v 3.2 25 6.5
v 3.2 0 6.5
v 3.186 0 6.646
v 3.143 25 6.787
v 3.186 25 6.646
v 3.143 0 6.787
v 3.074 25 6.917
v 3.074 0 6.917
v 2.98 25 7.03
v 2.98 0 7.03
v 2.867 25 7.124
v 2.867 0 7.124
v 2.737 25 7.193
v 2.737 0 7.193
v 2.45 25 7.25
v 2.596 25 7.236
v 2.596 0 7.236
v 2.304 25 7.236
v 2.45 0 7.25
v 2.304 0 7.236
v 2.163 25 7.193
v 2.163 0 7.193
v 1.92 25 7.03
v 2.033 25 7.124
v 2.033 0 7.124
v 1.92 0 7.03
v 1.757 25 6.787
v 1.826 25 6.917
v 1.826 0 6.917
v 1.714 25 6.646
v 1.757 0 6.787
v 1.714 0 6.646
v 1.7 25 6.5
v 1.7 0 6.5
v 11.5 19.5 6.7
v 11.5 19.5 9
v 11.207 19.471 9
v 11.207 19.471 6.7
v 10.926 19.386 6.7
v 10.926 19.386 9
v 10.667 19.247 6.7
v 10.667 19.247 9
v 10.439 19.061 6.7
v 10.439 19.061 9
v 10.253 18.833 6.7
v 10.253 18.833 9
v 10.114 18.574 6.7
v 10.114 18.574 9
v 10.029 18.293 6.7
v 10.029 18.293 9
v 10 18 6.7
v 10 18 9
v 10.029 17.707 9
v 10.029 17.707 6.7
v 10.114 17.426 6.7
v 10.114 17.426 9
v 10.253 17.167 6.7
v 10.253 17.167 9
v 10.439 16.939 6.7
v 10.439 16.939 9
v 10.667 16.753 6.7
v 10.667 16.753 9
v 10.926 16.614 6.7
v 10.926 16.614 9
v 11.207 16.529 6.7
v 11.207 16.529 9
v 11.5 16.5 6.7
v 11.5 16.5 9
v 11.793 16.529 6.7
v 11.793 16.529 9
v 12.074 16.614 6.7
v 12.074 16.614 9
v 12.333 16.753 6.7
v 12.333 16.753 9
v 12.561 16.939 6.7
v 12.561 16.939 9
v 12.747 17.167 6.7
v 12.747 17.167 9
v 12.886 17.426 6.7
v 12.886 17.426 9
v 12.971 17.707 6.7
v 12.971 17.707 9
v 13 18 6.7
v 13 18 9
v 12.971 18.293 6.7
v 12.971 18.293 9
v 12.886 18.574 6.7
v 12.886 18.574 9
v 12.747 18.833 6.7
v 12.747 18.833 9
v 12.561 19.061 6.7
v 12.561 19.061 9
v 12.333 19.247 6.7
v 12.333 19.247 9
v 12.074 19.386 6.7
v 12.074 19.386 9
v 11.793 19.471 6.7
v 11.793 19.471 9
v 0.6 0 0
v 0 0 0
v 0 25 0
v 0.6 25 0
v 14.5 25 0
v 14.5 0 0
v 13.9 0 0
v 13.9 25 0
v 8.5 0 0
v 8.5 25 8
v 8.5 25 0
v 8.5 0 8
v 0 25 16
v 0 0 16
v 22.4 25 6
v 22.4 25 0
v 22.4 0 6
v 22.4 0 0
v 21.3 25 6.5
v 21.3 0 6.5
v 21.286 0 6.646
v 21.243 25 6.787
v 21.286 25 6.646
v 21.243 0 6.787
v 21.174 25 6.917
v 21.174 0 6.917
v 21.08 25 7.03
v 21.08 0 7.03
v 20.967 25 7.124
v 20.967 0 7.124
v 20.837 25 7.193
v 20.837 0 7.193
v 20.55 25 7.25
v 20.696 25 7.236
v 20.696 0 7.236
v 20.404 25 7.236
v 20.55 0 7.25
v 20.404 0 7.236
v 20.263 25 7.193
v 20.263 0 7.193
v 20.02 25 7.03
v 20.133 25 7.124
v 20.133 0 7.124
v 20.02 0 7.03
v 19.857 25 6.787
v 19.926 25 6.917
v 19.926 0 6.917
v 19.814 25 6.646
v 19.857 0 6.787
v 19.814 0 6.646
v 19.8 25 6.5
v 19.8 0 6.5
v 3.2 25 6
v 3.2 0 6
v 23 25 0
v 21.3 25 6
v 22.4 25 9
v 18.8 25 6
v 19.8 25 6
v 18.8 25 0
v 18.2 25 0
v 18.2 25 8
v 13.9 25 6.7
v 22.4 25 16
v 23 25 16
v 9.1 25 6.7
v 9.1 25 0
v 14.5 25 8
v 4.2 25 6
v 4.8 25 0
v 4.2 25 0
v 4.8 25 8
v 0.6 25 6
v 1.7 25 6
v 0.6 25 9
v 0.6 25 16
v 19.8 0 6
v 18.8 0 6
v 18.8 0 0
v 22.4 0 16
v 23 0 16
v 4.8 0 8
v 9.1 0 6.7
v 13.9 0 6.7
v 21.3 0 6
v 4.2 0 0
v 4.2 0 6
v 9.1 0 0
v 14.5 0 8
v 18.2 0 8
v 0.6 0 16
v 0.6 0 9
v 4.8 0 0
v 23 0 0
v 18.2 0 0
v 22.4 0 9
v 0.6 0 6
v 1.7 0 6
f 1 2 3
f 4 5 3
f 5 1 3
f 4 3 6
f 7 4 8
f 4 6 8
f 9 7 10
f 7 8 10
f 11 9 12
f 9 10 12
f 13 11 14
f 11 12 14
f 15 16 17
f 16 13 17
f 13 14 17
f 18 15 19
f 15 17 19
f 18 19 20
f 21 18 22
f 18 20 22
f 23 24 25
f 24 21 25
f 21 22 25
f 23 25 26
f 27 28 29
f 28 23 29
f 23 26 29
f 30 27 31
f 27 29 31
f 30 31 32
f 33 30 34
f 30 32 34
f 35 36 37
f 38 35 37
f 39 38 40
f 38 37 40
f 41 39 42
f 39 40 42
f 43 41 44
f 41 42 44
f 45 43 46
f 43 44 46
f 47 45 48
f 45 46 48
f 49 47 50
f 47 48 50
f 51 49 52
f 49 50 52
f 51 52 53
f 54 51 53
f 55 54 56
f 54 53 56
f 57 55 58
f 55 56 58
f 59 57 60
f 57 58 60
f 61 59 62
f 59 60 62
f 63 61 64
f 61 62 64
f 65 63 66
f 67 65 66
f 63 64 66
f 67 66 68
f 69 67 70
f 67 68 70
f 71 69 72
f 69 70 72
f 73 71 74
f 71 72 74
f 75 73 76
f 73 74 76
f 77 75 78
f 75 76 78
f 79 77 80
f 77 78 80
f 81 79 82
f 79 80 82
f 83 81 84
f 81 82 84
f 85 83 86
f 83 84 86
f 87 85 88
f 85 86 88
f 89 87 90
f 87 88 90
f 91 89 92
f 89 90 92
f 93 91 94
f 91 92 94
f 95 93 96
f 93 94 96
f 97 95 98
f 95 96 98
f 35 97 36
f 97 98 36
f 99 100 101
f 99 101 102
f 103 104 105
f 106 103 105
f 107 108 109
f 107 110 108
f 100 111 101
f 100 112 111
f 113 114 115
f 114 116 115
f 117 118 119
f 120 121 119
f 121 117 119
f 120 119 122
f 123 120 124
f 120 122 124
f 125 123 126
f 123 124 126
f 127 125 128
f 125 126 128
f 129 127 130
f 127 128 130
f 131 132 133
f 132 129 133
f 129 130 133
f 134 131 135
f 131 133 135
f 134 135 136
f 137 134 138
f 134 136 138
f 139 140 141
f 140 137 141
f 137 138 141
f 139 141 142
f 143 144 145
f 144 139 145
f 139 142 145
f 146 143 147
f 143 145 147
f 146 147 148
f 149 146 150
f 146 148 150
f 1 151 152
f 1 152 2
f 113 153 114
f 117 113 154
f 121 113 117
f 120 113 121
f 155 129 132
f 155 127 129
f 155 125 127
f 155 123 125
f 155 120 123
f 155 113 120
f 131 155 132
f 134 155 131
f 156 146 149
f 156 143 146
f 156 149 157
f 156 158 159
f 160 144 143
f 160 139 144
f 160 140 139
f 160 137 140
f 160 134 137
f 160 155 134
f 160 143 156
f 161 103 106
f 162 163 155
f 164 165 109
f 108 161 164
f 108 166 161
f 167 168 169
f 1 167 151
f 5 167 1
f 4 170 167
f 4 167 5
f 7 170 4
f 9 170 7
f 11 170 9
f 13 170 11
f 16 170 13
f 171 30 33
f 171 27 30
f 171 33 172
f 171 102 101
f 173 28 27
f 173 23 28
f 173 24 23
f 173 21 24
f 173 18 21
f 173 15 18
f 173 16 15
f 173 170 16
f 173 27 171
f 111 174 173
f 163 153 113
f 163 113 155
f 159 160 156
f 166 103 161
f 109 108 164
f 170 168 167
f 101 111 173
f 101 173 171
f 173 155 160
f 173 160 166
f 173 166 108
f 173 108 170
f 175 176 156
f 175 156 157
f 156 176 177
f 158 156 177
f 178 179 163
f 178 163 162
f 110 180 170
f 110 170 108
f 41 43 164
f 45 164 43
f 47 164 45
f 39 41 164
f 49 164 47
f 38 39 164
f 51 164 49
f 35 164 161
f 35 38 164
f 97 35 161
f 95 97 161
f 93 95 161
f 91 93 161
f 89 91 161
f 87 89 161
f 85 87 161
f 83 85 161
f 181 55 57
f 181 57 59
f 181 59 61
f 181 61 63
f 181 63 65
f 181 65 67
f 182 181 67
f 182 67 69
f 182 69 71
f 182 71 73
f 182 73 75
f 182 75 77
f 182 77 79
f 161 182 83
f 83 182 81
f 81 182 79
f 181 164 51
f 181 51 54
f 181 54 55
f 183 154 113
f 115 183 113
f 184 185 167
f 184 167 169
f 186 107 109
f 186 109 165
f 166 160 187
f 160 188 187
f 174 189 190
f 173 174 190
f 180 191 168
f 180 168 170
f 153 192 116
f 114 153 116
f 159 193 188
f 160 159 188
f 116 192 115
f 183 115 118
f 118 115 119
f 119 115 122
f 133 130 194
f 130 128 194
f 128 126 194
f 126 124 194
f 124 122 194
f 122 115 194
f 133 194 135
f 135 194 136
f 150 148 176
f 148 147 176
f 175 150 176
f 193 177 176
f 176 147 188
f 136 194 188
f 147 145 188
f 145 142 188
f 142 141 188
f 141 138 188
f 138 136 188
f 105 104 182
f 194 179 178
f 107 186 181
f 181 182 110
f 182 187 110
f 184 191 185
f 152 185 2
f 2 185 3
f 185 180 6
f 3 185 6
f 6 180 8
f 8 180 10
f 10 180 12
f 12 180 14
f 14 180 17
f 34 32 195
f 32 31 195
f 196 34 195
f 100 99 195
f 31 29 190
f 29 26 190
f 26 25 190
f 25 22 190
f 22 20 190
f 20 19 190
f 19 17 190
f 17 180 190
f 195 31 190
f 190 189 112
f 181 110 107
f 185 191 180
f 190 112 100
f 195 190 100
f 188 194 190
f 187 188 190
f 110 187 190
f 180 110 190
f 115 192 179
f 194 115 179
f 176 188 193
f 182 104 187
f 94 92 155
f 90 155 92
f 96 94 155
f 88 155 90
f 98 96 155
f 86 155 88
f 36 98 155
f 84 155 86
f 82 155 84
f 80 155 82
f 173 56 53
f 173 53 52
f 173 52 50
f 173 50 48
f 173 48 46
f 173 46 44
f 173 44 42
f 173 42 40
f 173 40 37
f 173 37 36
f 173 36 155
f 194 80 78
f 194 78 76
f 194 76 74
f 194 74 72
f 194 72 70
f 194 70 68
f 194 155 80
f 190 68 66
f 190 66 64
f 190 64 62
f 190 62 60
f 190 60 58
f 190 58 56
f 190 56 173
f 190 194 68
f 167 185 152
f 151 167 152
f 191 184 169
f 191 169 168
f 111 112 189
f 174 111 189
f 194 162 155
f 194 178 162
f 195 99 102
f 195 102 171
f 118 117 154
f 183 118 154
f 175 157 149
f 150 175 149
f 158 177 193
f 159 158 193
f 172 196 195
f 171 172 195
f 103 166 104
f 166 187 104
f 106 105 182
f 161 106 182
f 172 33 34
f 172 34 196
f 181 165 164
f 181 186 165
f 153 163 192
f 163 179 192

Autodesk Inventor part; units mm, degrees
ref_plane "YZ Plane" through (0, 0, 0) normal (1, 0, 0) x (0, 1, 0)
ref_plane "XZ Plane" through (0, 0, 0) normal (0, 1, 0) x (-1, 0, 0)
ref_plane "XY Plane" through (0, 0, 0) normal (0, 0, 1) x (1, 0, 0)
sketch "Skizze1" plane through (0, 0, 0) normal (0, 1, 0) x (-1, 0, 0)
  line L0 (0, 16) -> (0, 0)
  line L1 (0, 16) -> (-0.6, 16)
  line L2 (-0.6, 16) -> (-0.6, 9)
  line L3 (0, 0) -> (-0.6, 0)
  line L4 (0, 0) -> (0.6, 0) construction
  line L5 (-0.6, 0) -> (-0.6, 6)
  line L6 (-4.2, 6) -> (-3.2, 6)
  line L7 (-3.2, 6) -> (-3.2, 6.5)
  arc A0 (-1.7, 6.5) -> (-3.2, 6.5) centre (-2.45, 6.5) ccw
  line L8 (-1.7, 6.5) -> (-1.7, 6)
  line L9 (-1.7, 6) -> (-0.6, 6)
  line L10 (-11.5, 23.3819) -> (-11.5, -15) construction
  line L11 (-4.2, 6) -> (-4.2, 0)
  line L12 (-4.2, 0) -> (-4.8, 0)
  line L13 (-4.8, 0) -> (-4.8, 8)
  line L14 (-4.8, 8) -> (-8.5, 8)
  line L15 (-0.6, 9) -> (-11.5, 9)
  line L16 (-8.5, 8) -> (-8.5, 0)
  line L17 (-8.5, 0) -> (-9.1, 0)
  line L18 (-9.1, 0) -> (-9.1, 6.7)
  line L19 (-9.1, 6.7) -> (-11.5, 6.7)
  line L20 (-23, 16) -> (-23, 0)
  line L21 (-23, 16) -> (-22.4, 16)
  line L22 (-22.4, 16) -> (-22.4, 9)
  line L23 (-23, 0) -> (-22.4, 0)
  line L24 (-23, 0) -> (-23.6, 0) construction
  line L25 (-22.4, 0) -> (-22.4, 6)
  line L26 (-19.8, 6) -> (-19.8, 6.5)
  line L27 (-18.8, 6) -> (-19.8, 6)
  arc A1 (-19.8, 6.5) -> (-21.3, 6.5) centre (-20.55, 6.5) ccw
  line L28 (-21.3, 6.5) -> (-21.3, 6)
  line L29 (-21.3, 6) -> (-22.4, 6)
  line L30 (-18.8, 6) -> (-18.8, 0)
  line L31 (-18.8, 0) -> (-18.2, 0)
  line L32 (-18.2, 0) -> (-18.2, 8)
  line L33 (-18.2, 8) -> (-14.5, 8)
  line L34 (-22.4, 9) -> (-11.5, 9)
  line L35 (-14.5, 8) -> (-14.5, 0)
  line L36 (-14.5, 0) -> (-13.9, 0)
  line L37 (-13.9, 0) -> (-13.9, 6.7)
  line L38 (-13.9, 6.7) -> (-11.5, 6.7)
  point P0 (0, 0)
  point P1 (-23, 0)
  dimension "d0" = 16
  dimension "d1" = 0.6
  dimension "d2" = 7
  dimension "d22" = 0.6
  dimension "d24" = 6
  dimension "d25" = 1
  dimension "d26" = 0.5
  dimension "d27" = 90
  dimension "d28" = 1.1
  dimension "d29" = 0.75
  dimension "d30" = 1.25
  dimension "d31" = 1.25
  dimension "d32" = 1.5
  dimension "d37" = 0.6
  dimension "d38" = 8
  dimension "d39" = 3.7
  dimension "d40" = 23
  dimension "d41" = 0.6
  dimension "d42" = 6.7
  dimension "d43" = 2.3
extrude "Extrusion1" add sketch "Skizze1" along normal blind 25
sketch "Skizze2" plane through (13.9, 0, 6.7) normal (0, 0, -1) x (-1, 0, 0)
  line L0 (0, 25) -> (4.8, 25) projected
  line L1 (0, 0) -> (0, 25) projected
  point P0 (13.9, 0)
  point P1 (2.4, 18)
  dimension "d46" = 7
  dimension "d47" = 2.4
hole "Bohrung1" at (11.5, 18, 6.7) direction (0, 0, 1) diameter 3 end through all
properties part number "Kühlkörper"
